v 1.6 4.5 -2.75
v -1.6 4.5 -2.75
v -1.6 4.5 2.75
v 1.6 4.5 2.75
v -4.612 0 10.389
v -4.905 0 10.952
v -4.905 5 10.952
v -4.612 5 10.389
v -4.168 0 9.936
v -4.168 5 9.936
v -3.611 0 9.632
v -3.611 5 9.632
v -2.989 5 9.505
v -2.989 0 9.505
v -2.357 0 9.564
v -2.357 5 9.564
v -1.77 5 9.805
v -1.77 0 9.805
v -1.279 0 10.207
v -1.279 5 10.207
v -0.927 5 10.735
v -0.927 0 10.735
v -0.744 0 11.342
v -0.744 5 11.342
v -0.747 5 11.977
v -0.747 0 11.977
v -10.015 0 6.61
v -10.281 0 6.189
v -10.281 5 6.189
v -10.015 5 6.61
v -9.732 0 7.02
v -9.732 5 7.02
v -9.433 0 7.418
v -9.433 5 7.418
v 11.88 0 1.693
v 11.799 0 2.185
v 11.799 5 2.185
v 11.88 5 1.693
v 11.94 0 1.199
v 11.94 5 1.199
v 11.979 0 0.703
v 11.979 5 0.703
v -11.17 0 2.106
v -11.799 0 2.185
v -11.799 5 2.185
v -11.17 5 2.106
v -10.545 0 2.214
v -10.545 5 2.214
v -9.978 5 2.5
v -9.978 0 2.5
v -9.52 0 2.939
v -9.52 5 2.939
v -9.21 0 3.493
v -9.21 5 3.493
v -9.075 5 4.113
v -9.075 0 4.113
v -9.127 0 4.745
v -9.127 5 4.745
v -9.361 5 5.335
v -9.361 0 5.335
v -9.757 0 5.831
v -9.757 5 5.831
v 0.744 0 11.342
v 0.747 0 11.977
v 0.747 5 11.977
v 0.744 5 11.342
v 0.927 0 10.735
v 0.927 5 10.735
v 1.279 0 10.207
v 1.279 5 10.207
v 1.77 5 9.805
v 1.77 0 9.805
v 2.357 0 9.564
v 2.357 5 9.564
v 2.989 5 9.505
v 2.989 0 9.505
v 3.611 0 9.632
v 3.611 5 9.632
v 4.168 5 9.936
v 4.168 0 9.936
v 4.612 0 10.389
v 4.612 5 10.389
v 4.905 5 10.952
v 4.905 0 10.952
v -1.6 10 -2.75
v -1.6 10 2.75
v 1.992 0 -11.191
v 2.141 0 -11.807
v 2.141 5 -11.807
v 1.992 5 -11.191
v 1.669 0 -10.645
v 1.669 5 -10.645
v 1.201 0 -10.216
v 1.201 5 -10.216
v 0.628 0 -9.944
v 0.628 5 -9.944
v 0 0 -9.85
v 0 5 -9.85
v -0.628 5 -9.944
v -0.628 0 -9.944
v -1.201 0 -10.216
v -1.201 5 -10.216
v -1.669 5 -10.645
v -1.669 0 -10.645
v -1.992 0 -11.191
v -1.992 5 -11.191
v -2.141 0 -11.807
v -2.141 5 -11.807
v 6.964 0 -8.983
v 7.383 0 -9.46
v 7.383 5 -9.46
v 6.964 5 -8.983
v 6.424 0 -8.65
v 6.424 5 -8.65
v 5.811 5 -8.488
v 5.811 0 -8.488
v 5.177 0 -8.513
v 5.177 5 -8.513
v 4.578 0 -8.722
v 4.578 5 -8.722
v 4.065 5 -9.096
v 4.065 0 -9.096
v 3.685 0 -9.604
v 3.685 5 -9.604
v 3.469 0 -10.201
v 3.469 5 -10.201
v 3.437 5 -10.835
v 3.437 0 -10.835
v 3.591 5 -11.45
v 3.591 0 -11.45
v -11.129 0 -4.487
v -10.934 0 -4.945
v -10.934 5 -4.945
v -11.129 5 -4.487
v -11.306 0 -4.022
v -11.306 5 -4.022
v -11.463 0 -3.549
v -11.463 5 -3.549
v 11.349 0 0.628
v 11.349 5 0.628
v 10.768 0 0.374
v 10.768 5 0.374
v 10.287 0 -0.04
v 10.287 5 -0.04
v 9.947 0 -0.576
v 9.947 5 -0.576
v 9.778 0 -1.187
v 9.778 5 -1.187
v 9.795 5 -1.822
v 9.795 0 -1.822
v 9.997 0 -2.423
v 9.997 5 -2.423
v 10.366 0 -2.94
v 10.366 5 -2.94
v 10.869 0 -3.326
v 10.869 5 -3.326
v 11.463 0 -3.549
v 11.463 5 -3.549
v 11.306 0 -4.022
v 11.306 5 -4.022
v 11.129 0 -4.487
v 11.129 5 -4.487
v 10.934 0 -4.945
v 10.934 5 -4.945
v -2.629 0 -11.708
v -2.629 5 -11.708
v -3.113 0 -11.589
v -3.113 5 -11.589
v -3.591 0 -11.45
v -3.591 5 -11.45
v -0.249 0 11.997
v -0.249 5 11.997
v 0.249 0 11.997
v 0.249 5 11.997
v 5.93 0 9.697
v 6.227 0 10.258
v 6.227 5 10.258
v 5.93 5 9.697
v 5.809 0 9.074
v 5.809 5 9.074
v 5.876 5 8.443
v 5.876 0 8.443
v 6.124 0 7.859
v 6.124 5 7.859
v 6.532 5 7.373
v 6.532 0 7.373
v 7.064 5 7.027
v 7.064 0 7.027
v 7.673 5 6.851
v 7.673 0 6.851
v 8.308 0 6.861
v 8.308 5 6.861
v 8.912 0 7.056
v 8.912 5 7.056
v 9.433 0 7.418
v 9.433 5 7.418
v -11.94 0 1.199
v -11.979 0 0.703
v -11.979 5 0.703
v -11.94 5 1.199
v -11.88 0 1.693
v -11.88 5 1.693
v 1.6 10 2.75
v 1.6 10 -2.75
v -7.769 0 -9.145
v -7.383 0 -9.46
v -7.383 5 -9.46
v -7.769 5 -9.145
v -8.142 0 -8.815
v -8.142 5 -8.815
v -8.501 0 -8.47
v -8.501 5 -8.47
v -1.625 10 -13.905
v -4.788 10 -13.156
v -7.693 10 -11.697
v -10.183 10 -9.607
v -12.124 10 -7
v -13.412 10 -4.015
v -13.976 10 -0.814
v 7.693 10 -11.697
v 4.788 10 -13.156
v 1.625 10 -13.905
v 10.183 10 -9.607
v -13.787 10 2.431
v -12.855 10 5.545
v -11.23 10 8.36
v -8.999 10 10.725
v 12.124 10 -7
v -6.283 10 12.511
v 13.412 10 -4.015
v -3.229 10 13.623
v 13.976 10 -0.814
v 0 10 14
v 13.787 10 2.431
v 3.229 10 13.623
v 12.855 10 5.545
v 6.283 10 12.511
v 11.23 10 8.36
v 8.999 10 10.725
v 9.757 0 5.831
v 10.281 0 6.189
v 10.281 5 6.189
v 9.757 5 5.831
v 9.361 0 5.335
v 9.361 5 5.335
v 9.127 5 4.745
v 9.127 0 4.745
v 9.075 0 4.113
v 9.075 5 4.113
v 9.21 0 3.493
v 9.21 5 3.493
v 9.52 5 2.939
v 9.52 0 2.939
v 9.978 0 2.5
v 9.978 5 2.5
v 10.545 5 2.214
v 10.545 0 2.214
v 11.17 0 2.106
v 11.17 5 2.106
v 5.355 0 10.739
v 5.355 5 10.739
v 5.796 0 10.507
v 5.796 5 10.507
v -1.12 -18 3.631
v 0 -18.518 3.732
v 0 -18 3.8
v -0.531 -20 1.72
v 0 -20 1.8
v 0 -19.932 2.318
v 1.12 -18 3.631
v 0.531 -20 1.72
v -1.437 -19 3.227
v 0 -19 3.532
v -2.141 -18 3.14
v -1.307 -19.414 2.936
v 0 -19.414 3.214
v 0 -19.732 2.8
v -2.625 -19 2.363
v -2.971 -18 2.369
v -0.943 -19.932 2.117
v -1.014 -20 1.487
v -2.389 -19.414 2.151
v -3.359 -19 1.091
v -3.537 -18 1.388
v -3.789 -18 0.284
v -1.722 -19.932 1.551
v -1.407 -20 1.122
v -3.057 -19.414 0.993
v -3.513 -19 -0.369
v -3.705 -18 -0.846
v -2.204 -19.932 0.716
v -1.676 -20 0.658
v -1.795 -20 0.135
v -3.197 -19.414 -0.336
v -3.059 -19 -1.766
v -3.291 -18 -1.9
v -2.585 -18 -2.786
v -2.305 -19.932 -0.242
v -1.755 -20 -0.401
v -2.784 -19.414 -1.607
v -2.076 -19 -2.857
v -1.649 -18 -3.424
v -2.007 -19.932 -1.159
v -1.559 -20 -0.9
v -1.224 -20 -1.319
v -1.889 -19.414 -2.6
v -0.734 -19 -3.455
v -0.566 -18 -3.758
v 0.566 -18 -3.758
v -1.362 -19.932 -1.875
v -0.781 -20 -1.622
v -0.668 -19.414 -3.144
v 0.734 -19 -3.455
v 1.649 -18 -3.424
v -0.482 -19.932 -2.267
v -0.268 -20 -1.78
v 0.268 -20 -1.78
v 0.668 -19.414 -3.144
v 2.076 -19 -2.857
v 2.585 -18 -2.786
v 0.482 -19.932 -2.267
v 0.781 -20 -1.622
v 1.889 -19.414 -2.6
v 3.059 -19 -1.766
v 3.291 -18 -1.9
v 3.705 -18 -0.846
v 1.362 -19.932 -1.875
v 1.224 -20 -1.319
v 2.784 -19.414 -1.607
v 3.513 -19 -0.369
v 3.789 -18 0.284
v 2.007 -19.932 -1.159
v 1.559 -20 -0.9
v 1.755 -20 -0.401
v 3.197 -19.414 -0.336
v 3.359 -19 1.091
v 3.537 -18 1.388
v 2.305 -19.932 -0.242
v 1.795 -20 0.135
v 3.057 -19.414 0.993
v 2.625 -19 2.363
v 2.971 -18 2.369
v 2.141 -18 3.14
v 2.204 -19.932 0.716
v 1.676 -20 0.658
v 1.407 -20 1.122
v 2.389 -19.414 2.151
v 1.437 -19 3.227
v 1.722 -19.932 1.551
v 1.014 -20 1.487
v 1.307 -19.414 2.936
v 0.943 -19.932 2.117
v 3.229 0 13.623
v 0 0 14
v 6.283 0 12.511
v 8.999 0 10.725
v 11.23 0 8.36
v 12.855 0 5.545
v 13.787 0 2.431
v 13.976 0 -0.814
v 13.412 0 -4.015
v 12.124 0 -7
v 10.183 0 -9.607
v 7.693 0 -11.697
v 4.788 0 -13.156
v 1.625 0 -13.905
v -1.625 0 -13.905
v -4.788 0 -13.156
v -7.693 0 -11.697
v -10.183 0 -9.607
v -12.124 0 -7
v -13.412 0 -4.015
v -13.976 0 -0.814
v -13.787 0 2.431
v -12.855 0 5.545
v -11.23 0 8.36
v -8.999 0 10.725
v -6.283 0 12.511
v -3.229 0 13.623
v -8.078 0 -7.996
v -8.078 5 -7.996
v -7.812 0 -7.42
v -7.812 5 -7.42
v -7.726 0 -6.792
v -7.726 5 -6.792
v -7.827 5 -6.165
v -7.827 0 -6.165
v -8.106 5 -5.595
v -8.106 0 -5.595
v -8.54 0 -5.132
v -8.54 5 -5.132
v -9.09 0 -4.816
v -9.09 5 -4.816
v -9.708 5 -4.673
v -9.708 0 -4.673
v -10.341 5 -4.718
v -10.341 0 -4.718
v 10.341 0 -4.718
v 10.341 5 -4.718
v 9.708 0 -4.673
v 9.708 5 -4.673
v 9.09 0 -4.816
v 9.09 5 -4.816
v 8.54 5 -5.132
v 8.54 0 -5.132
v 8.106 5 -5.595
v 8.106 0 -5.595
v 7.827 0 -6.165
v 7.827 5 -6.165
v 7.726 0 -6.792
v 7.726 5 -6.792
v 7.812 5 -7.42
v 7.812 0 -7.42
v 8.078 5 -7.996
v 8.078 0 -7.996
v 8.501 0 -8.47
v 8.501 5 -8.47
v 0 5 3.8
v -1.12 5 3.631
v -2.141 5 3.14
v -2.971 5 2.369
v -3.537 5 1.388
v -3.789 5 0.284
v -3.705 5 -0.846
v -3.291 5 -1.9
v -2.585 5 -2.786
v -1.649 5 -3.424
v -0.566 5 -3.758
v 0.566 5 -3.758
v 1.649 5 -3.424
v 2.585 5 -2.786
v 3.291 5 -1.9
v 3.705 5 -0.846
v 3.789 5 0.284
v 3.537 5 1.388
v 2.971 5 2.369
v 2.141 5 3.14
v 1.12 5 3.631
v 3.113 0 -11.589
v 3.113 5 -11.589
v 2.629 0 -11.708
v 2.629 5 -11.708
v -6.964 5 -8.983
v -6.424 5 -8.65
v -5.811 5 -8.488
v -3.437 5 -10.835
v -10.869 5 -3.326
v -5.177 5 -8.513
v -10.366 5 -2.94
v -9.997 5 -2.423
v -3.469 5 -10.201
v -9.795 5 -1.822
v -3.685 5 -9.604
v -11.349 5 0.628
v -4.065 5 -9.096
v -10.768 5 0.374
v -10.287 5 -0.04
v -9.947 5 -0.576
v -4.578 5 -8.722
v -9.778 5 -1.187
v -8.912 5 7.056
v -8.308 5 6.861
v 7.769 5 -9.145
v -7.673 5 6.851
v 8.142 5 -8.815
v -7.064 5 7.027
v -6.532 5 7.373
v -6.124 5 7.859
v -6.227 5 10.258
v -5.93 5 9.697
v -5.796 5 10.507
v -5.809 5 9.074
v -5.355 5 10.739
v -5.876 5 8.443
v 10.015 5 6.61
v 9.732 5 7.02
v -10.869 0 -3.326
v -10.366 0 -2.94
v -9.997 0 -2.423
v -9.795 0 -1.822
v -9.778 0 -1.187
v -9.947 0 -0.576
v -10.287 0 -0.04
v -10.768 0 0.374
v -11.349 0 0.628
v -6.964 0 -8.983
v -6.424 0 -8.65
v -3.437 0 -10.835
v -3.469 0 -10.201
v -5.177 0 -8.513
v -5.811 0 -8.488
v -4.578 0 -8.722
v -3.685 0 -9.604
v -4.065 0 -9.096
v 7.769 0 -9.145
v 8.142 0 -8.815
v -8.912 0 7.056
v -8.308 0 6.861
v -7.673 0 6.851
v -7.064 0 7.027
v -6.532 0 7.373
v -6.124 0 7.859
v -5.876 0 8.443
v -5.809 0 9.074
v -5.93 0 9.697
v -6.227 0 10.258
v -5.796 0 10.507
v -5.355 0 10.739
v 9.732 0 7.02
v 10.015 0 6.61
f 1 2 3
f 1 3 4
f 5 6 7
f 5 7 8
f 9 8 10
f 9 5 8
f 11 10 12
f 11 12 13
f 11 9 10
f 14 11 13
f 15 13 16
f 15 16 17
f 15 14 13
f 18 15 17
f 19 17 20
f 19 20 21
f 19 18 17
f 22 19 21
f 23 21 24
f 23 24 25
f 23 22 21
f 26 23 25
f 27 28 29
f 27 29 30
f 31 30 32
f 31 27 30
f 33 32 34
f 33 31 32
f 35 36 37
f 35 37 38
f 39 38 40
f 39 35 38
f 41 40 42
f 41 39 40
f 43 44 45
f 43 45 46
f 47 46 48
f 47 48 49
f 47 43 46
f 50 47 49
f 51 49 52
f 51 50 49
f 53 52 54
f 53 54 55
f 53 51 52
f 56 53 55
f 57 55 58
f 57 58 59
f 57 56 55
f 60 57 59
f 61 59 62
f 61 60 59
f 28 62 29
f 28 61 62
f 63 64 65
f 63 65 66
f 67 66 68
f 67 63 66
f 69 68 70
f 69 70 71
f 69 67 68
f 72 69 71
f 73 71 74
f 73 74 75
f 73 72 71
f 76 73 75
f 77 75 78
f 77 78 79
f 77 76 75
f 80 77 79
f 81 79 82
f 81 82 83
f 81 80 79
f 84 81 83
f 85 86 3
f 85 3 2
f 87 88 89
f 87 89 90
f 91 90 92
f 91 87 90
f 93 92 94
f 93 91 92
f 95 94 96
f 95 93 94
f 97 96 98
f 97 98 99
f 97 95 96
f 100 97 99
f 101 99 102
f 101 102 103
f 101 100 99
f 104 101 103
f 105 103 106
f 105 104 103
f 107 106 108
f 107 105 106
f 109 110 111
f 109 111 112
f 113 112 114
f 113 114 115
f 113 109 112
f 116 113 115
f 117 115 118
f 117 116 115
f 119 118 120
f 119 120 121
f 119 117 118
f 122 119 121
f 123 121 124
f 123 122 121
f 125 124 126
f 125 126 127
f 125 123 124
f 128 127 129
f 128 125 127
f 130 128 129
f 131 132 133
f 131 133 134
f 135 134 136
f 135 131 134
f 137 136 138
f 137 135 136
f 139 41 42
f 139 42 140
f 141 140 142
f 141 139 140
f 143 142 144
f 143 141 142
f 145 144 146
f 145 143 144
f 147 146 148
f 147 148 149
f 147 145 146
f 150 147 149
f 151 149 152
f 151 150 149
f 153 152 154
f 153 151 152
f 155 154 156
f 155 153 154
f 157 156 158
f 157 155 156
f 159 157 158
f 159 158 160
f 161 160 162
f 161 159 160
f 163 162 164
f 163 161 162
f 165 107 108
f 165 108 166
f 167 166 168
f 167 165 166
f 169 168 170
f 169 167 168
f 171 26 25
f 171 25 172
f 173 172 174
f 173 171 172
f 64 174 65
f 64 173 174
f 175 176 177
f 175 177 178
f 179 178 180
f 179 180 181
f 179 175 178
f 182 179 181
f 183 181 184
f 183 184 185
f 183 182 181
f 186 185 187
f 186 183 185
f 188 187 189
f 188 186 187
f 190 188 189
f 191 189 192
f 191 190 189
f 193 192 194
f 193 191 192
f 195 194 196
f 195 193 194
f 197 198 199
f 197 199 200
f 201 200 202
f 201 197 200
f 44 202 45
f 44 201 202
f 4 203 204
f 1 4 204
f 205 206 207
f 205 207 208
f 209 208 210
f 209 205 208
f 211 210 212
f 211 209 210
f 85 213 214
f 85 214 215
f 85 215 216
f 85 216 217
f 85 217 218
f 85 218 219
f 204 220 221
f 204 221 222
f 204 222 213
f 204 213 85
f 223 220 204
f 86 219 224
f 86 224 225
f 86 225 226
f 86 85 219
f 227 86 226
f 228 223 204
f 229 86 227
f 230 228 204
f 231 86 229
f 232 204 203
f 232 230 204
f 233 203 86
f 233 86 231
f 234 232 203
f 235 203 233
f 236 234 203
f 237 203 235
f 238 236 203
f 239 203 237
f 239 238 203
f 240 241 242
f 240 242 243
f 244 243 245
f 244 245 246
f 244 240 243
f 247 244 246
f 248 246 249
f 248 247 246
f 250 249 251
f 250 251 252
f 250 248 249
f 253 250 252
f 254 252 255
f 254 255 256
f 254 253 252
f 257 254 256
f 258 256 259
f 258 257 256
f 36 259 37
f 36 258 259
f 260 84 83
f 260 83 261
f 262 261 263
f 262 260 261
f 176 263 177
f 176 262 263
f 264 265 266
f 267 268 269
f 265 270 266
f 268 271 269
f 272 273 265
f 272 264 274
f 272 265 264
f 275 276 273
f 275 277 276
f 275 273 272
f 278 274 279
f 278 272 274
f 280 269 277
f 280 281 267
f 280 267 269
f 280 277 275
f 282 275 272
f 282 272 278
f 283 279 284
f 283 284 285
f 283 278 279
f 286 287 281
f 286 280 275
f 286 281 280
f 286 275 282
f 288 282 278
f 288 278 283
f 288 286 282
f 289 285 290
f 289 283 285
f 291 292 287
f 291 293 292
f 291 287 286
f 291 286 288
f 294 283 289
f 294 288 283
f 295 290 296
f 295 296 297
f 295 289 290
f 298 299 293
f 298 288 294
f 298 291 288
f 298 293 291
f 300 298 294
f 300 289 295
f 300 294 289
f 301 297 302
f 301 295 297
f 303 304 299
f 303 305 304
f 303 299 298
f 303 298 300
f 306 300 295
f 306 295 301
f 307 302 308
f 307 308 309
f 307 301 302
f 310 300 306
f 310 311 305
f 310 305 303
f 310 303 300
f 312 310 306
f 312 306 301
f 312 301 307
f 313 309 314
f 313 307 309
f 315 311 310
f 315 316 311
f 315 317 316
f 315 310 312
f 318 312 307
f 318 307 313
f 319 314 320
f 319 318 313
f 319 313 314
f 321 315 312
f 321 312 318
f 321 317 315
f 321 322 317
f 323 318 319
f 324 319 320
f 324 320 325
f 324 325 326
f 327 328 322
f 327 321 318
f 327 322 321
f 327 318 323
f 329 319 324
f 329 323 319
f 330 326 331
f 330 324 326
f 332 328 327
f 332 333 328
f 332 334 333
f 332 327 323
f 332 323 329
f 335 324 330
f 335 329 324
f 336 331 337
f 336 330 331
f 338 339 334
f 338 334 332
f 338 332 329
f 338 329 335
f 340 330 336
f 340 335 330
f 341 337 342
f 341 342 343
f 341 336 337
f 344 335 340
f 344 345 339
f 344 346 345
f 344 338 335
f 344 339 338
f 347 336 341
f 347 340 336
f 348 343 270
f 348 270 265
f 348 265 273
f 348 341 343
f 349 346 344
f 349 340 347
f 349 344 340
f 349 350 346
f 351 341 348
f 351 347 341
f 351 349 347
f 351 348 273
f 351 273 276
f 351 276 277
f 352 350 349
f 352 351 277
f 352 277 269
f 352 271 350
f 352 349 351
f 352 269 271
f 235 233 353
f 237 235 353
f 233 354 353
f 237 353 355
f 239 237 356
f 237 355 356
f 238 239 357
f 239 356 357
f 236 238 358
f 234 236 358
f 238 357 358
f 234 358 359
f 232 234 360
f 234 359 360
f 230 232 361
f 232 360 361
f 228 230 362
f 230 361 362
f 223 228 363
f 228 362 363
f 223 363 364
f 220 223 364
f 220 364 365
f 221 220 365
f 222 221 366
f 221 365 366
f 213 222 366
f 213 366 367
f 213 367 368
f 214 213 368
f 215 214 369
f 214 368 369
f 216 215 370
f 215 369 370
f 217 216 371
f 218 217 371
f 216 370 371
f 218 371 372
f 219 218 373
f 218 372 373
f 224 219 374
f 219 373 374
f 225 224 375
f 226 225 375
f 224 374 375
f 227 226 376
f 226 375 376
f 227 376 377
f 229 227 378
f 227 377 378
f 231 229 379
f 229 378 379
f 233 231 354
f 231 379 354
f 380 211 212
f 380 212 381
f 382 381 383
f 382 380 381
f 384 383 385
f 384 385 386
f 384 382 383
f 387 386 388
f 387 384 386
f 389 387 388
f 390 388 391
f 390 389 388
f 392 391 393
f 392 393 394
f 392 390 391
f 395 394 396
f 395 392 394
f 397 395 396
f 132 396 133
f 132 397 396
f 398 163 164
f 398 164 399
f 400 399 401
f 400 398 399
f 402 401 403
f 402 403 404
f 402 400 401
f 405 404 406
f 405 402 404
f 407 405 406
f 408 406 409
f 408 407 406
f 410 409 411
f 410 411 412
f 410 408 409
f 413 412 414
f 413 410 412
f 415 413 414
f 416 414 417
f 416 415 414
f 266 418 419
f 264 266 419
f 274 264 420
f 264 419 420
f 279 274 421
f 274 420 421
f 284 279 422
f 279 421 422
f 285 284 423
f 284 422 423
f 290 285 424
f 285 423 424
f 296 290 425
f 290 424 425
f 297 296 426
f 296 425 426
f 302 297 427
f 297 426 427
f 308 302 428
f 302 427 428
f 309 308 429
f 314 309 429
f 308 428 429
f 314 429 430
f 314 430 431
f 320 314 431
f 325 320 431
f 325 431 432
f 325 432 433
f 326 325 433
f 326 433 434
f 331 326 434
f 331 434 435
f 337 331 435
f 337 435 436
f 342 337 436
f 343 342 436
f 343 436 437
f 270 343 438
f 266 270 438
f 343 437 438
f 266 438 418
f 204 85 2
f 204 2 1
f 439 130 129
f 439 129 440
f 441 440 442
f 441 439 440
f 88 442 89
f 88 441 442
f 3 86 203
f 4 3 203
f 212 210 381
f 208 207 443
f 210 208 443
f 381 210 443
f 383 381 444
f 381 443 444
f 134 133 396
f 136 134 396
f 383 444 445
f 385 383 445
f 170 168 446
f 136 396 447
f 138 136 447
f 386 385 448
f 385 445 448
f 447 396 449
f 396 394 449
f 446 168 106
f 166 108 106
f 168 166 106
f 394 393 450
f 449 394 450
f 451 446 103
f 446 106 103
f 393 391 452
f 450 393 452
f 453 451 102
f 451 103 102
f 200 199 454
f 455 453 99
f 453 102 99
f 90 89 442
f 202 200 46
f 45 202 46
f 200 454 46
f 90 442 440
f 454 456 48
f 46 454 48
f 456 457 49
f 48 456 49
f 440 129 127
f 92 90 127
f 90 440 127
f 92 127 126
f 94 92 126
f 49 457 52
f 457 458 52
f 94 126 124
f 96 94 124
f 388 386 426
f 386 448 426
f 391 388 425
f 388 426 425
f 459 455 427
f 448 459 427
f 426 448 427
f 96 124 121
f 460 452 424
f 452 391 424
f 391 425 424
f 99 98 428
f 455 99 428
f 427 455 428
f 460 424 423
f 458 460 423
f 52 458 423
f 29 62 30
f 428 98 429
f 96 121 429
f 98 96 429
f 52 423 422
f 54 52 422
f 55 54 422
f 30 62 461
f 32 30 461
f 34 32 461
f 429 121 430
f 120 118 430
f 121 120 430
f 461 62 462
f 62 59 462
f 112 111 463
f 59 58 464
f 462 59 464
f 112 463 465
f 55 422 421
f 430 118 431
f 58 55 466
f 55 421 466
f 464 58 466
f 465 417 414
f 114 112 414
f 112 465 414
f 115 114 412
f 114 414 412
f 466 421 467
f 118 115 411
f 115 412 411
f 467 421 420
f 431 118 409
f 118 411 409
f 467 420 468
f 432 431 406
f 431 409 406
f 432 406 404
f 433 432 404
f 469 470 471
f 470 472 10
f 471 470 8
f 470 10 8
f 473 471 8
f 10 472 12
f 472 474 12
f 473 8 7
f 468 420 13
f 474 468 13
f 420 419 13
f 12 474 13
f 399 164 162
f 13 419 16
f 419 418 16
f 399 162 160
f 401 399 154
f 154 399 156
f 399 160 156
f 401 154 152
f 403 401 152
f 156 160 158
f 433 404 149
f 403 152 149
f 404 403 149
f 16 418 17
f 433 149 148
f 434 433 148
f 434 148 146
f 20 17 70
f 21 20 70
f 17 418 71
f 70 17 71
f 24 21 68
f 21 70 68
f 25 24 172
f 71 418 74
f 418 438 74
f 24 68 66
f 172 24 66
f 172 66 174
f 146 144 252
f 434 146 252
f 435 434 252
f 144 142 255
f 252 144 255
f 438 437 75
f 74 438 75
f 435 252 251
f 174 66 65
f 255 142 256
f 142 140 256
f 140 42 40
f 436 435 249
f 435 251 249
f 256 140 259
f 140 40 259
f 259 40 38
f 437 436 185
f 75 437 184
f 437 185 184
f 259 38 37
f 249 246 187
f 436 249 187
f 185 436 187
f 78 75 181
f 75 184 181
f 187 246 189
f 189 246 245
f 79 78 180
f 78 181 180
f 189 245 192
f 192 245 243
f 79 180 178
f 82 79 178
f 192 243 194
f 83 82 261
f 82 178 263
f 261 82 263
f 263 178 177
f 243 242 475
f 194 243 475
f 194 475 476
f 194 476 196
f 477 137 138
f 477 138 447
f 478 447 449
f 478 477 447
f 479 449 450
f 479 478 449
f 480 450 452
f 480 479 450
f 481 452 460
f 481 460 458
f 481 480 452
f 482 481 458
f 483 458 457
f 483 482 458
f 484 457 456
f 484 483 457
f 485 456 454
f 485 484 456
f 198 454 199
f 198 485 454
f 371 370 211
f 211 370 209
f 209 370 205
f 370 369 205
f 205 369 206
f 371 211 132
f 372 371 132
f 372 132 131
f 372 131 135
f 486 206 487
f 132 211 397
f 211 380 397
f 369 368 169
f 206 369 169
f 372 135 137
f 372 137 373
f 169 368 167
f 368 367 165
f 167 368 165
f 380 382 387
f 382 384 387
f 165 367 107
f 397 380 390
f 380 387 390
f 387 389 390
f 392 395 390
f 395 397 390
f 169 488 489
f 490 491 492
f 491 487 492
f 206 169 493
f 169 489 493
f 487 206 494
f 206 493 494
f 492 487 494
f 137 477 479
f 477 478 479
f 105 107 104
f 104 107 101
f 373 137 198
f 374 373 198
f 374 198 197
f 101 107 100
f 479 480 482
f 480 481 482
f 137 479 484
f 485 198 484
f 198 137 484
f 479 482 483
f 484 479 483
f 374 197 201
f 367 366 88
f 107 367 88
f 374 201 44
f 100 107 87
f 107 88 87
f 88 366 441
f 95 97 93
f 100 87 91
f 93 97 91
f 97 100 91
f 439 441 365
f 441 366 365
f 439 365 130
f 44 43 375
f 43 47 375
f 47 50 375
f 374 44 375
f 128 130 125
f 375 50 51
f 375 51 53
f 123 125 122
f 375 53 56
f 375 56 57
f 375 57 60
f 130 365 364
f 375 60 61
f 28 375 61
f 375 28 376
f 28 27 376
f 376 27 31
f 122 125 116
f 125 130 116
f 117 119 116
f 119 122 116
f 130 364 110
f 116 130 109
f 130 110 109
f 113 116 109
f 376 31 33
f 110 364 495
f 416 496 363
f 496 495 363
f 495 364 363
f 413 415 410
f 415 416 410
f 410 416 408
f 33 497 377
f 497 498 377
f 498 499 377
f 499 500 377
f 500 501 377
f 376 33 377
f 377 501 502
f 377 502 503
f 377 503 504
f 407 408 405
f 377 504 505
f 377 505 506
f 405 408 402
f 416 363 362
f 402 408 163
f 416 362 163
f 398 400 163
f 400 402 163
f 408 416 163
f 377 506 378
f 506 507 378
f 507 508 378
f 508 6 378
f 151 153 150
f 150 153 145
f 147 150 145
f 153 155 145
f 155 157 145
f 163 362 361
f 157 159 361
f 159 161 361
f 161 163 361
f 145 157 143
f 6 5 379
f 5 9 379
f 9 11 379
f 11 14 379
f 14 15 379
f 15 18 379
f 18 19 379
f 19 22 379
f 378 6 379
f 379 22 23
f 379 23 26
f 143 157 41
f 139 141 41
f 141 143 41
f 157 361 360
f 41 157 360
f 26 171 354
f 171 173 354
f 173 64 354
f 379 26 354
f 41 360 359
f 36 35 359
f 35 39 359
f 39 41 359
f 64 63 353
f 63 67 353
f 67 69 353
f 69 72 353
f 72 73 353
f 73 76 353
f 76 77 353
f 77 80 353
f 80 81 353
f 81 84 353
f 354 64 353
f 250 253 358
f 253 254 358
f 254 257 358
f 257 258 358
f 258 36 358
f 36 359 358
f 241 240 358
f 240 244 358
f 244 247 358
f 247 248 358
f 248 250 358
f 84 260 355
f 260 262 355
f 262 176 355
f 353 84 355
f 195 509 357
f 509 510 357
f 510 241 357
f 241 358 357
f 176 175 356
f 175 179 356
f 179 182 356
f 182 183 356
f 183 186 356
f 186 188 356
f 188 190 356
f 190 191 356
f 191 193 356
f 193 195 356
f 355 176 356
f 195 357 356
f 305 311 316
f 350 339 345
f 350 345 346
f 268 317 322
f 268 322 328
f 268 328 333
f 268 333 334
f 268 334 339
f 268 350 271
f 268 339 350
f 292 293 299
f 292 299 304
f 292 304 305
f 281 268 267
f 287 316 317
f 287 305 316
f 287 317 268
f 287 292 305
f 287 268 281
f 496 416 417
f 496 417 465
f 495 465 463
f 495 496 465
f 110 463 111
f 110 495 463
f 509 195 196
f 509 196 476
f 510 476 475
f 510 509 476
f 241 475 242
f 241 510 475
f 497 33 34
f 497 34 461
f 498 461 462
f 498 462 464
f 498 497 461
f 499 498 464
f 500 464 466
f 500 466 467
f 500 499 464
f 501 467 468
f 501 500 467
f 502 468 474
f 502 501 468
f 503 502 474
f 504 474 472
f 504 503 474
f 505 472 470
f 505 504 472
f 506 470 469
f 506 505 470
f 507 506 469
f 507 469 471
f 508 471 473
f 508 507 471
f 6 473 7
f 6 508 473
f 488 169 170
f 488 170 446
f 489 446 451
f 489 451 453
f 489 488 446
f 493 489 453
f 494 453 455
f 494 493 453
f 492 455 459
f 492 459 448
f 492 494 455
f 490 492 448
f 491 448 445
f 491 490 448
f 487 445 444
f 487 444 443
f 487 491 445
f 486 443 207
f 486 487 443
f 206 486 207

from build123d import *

# Parameters (mm, degrees)
SKETCH_1_R          = 14
EXTRUDE_1_DEPTH     = 5
SKETCH_2_R          = 14
EXTRUDE_2_DEPTH     = 5
SKETCH_4_R          = 3.8
EXTRUDE_3_DEPTH     = 25
FILLET_1_R          = 2
SKETCH_3_W          = 3.2
SKETCH_3_H          = 5.5
CUT_EXTRUDE_1_DEPTH = 5.5


with BuildPart() as part:
    # Эскиз1 → Бобышка-Вытянуть1 (new body)
    with BuildSketch(Plane(origin=(0, 0, 0), x_dir=(1, 0, 0), z_dir=(0, 1, 0))):
        with Locations(Location((0, 0, 0), (0, 0, 270))):
            Circle(SKETCH_1_R)
        with BuildLine():
            ThreePointArc((-7.383246629, 9.45979224), (-7.957471899, 8.982128978), (-8.500867665, 8.469666401))
            ThreePointArc((-8.500867665, 8.469666401), (-8.106391079, 5.595437755), (-10.933724873, 4.945064246))
            ThreePointArc((-10.933724873, 4.945064246), (-11.220194912, 4.255258645), (-11.463194733, 3.548966963))
            ThreePointArc((-11.463194733, 3.548966963), (-9.77818241, 1.187286301), (-11.979418514, -0.702518371))
            ThreePointArc((-11.979418514, -0.702518371), (-11.912506489, -1.446440163), (-11.799442035, -2.184758036))
            ThreePointArc((-11.799442035, -2.184758036), (-9.20990999, -3.492858137), (-10.280771741, -6.189162496))
            ThreePointArc((-10.280771741, -6.189162496), (-9.875806391, -6.816776961), (-9.432579364, -7.417981298))
            ThreePointArc((-9.432579364, -7.417981298), (-6.531758184, -7.372830869), (-6.226924059, -10.25794408))
            ThreePointArc((-6.226924059, -10.25794408), (-5.576678065, -10.625472308), (-4.904826437, -10.951834441))
            ThreePointArc((-4.904826437, -10.951834441), (-2.357259293, -9.563776902), (-0.746563118, -11.976754298))
            ThreePointArc((-0.746563118, -11.976754298), (0, -12), (0.746563118, -11.976754298))
            ThreePointArc((0.746563118, -11.976754298), (2.357259293, -9.563776902), (4.904826437, -10.951834441))
            ThreePointArc((4.904826437, -10.951834441), (5.576678065, -10.625472308), (6.226924059, -10.25794408))
            ThreePointArc((6.226924059, -10.25794408), (6.531758184, -7.372830869), (9.432579364, -7.417981298))
            ThreePointArc((9.432579364, -7.417981298), (9.875806391, -6.816776961), (10.280771741, -6.189162496))
            ThreePointArc((10.280771741, -6.189162496), (9.20990999, -3.492858137), (11.799442035, -2.184758036))
            ThreePointArc((11.799442035, -2.184758036), (11.912506489, -1.446440163), (11.979418514, -0.702518371))
            ThreePointArc((11.979418514, -0.702518371), (9.77818241, 1.187286301), (11.463194733, 3.548966963))
            ThreePointArc((11.463194733, 3.548966963), (11.220194912, 4.255258645), (10.933724873, 4.945064246))
            ThreePointArc((10.933724873, 4.945064246), (8.106391079, 5.595437755), (8.500867665, 8.469666401))
            ThreePointArc((8.500867665, 8.469666401), (7.957471899, 8.982128978), (7.383246629, 9.45979224))
            ThreePointArc((7.383246629, 9.45979224), (4.577523245, 8.721741853), (3.591094261, 11.450067336))
            ThreePointArc((3.591094261, 11.450067336), (2.871787971, 11.651301809), (2.14135556, 11.807395833))
            ThreePointArc((2.14135556, 11.807395833), (0, 9.85), (-2.14135556, 11.807395833))
            ThreePointArc((-2.14135556, 11.807395833), (-2.871787971, 11.651301809), (-3.591094261, 11.450067336))
            ThreePointArc((-3.591094261, 11.450067336), (-4.577523245, 8.721741853), (-7.383246629, 9.45979224))
        make_face(mode=Mode.SUBTRACT)
    extrude(amount=EXTRUDE_1_DEPTH)

    # Эскиз2 → Бобышка-Вытянуть2 (add)
    with BuildSketch(Plane(origin=(0, 5, 0), x_dir=(1, 0, 0), z_dir=(0, 1, 0))):
        with Locations(Location((0, 0, 0), (0, 0, 270))):
            Circle(SKETCH_2_R)
    extrude(amount=EXTRUDE_2_DEPTH)

    # Эскиз4 → Бобышка-Вытянуть3 (add)
    with BuildSketch(Plane.XZ.offset(-5)):
        with Locations(Location((0, 0, 0), (0, 0, 90))):
            Circle(SKETCH_4_R)
    extrude(amount=EXTRUDE_3_DEPTH)

    # Скругление1
    fillet_1_edges = [part.edges().sort_by_distance(p)[0] for p in [
        (0, -20, -3.8),
    ]]
    fillet(fillet_1_edges, radius=FILLET_1_R)

    # Эскиз3 → Вырез-Вытянуть1 (cut)
    with BuildSketch(Plane(origin=(0, 10, 0), x_dir=(1, 0, 0), z_dir=(0, 1, 0))):
        Rectangle(SKETCH_3_W, SKETCH_3_H)
    extrude(amount=-CUT_EXTRUDE_1_DEPTH, mode=Mode.SUBTRACT)


solid = part.part
